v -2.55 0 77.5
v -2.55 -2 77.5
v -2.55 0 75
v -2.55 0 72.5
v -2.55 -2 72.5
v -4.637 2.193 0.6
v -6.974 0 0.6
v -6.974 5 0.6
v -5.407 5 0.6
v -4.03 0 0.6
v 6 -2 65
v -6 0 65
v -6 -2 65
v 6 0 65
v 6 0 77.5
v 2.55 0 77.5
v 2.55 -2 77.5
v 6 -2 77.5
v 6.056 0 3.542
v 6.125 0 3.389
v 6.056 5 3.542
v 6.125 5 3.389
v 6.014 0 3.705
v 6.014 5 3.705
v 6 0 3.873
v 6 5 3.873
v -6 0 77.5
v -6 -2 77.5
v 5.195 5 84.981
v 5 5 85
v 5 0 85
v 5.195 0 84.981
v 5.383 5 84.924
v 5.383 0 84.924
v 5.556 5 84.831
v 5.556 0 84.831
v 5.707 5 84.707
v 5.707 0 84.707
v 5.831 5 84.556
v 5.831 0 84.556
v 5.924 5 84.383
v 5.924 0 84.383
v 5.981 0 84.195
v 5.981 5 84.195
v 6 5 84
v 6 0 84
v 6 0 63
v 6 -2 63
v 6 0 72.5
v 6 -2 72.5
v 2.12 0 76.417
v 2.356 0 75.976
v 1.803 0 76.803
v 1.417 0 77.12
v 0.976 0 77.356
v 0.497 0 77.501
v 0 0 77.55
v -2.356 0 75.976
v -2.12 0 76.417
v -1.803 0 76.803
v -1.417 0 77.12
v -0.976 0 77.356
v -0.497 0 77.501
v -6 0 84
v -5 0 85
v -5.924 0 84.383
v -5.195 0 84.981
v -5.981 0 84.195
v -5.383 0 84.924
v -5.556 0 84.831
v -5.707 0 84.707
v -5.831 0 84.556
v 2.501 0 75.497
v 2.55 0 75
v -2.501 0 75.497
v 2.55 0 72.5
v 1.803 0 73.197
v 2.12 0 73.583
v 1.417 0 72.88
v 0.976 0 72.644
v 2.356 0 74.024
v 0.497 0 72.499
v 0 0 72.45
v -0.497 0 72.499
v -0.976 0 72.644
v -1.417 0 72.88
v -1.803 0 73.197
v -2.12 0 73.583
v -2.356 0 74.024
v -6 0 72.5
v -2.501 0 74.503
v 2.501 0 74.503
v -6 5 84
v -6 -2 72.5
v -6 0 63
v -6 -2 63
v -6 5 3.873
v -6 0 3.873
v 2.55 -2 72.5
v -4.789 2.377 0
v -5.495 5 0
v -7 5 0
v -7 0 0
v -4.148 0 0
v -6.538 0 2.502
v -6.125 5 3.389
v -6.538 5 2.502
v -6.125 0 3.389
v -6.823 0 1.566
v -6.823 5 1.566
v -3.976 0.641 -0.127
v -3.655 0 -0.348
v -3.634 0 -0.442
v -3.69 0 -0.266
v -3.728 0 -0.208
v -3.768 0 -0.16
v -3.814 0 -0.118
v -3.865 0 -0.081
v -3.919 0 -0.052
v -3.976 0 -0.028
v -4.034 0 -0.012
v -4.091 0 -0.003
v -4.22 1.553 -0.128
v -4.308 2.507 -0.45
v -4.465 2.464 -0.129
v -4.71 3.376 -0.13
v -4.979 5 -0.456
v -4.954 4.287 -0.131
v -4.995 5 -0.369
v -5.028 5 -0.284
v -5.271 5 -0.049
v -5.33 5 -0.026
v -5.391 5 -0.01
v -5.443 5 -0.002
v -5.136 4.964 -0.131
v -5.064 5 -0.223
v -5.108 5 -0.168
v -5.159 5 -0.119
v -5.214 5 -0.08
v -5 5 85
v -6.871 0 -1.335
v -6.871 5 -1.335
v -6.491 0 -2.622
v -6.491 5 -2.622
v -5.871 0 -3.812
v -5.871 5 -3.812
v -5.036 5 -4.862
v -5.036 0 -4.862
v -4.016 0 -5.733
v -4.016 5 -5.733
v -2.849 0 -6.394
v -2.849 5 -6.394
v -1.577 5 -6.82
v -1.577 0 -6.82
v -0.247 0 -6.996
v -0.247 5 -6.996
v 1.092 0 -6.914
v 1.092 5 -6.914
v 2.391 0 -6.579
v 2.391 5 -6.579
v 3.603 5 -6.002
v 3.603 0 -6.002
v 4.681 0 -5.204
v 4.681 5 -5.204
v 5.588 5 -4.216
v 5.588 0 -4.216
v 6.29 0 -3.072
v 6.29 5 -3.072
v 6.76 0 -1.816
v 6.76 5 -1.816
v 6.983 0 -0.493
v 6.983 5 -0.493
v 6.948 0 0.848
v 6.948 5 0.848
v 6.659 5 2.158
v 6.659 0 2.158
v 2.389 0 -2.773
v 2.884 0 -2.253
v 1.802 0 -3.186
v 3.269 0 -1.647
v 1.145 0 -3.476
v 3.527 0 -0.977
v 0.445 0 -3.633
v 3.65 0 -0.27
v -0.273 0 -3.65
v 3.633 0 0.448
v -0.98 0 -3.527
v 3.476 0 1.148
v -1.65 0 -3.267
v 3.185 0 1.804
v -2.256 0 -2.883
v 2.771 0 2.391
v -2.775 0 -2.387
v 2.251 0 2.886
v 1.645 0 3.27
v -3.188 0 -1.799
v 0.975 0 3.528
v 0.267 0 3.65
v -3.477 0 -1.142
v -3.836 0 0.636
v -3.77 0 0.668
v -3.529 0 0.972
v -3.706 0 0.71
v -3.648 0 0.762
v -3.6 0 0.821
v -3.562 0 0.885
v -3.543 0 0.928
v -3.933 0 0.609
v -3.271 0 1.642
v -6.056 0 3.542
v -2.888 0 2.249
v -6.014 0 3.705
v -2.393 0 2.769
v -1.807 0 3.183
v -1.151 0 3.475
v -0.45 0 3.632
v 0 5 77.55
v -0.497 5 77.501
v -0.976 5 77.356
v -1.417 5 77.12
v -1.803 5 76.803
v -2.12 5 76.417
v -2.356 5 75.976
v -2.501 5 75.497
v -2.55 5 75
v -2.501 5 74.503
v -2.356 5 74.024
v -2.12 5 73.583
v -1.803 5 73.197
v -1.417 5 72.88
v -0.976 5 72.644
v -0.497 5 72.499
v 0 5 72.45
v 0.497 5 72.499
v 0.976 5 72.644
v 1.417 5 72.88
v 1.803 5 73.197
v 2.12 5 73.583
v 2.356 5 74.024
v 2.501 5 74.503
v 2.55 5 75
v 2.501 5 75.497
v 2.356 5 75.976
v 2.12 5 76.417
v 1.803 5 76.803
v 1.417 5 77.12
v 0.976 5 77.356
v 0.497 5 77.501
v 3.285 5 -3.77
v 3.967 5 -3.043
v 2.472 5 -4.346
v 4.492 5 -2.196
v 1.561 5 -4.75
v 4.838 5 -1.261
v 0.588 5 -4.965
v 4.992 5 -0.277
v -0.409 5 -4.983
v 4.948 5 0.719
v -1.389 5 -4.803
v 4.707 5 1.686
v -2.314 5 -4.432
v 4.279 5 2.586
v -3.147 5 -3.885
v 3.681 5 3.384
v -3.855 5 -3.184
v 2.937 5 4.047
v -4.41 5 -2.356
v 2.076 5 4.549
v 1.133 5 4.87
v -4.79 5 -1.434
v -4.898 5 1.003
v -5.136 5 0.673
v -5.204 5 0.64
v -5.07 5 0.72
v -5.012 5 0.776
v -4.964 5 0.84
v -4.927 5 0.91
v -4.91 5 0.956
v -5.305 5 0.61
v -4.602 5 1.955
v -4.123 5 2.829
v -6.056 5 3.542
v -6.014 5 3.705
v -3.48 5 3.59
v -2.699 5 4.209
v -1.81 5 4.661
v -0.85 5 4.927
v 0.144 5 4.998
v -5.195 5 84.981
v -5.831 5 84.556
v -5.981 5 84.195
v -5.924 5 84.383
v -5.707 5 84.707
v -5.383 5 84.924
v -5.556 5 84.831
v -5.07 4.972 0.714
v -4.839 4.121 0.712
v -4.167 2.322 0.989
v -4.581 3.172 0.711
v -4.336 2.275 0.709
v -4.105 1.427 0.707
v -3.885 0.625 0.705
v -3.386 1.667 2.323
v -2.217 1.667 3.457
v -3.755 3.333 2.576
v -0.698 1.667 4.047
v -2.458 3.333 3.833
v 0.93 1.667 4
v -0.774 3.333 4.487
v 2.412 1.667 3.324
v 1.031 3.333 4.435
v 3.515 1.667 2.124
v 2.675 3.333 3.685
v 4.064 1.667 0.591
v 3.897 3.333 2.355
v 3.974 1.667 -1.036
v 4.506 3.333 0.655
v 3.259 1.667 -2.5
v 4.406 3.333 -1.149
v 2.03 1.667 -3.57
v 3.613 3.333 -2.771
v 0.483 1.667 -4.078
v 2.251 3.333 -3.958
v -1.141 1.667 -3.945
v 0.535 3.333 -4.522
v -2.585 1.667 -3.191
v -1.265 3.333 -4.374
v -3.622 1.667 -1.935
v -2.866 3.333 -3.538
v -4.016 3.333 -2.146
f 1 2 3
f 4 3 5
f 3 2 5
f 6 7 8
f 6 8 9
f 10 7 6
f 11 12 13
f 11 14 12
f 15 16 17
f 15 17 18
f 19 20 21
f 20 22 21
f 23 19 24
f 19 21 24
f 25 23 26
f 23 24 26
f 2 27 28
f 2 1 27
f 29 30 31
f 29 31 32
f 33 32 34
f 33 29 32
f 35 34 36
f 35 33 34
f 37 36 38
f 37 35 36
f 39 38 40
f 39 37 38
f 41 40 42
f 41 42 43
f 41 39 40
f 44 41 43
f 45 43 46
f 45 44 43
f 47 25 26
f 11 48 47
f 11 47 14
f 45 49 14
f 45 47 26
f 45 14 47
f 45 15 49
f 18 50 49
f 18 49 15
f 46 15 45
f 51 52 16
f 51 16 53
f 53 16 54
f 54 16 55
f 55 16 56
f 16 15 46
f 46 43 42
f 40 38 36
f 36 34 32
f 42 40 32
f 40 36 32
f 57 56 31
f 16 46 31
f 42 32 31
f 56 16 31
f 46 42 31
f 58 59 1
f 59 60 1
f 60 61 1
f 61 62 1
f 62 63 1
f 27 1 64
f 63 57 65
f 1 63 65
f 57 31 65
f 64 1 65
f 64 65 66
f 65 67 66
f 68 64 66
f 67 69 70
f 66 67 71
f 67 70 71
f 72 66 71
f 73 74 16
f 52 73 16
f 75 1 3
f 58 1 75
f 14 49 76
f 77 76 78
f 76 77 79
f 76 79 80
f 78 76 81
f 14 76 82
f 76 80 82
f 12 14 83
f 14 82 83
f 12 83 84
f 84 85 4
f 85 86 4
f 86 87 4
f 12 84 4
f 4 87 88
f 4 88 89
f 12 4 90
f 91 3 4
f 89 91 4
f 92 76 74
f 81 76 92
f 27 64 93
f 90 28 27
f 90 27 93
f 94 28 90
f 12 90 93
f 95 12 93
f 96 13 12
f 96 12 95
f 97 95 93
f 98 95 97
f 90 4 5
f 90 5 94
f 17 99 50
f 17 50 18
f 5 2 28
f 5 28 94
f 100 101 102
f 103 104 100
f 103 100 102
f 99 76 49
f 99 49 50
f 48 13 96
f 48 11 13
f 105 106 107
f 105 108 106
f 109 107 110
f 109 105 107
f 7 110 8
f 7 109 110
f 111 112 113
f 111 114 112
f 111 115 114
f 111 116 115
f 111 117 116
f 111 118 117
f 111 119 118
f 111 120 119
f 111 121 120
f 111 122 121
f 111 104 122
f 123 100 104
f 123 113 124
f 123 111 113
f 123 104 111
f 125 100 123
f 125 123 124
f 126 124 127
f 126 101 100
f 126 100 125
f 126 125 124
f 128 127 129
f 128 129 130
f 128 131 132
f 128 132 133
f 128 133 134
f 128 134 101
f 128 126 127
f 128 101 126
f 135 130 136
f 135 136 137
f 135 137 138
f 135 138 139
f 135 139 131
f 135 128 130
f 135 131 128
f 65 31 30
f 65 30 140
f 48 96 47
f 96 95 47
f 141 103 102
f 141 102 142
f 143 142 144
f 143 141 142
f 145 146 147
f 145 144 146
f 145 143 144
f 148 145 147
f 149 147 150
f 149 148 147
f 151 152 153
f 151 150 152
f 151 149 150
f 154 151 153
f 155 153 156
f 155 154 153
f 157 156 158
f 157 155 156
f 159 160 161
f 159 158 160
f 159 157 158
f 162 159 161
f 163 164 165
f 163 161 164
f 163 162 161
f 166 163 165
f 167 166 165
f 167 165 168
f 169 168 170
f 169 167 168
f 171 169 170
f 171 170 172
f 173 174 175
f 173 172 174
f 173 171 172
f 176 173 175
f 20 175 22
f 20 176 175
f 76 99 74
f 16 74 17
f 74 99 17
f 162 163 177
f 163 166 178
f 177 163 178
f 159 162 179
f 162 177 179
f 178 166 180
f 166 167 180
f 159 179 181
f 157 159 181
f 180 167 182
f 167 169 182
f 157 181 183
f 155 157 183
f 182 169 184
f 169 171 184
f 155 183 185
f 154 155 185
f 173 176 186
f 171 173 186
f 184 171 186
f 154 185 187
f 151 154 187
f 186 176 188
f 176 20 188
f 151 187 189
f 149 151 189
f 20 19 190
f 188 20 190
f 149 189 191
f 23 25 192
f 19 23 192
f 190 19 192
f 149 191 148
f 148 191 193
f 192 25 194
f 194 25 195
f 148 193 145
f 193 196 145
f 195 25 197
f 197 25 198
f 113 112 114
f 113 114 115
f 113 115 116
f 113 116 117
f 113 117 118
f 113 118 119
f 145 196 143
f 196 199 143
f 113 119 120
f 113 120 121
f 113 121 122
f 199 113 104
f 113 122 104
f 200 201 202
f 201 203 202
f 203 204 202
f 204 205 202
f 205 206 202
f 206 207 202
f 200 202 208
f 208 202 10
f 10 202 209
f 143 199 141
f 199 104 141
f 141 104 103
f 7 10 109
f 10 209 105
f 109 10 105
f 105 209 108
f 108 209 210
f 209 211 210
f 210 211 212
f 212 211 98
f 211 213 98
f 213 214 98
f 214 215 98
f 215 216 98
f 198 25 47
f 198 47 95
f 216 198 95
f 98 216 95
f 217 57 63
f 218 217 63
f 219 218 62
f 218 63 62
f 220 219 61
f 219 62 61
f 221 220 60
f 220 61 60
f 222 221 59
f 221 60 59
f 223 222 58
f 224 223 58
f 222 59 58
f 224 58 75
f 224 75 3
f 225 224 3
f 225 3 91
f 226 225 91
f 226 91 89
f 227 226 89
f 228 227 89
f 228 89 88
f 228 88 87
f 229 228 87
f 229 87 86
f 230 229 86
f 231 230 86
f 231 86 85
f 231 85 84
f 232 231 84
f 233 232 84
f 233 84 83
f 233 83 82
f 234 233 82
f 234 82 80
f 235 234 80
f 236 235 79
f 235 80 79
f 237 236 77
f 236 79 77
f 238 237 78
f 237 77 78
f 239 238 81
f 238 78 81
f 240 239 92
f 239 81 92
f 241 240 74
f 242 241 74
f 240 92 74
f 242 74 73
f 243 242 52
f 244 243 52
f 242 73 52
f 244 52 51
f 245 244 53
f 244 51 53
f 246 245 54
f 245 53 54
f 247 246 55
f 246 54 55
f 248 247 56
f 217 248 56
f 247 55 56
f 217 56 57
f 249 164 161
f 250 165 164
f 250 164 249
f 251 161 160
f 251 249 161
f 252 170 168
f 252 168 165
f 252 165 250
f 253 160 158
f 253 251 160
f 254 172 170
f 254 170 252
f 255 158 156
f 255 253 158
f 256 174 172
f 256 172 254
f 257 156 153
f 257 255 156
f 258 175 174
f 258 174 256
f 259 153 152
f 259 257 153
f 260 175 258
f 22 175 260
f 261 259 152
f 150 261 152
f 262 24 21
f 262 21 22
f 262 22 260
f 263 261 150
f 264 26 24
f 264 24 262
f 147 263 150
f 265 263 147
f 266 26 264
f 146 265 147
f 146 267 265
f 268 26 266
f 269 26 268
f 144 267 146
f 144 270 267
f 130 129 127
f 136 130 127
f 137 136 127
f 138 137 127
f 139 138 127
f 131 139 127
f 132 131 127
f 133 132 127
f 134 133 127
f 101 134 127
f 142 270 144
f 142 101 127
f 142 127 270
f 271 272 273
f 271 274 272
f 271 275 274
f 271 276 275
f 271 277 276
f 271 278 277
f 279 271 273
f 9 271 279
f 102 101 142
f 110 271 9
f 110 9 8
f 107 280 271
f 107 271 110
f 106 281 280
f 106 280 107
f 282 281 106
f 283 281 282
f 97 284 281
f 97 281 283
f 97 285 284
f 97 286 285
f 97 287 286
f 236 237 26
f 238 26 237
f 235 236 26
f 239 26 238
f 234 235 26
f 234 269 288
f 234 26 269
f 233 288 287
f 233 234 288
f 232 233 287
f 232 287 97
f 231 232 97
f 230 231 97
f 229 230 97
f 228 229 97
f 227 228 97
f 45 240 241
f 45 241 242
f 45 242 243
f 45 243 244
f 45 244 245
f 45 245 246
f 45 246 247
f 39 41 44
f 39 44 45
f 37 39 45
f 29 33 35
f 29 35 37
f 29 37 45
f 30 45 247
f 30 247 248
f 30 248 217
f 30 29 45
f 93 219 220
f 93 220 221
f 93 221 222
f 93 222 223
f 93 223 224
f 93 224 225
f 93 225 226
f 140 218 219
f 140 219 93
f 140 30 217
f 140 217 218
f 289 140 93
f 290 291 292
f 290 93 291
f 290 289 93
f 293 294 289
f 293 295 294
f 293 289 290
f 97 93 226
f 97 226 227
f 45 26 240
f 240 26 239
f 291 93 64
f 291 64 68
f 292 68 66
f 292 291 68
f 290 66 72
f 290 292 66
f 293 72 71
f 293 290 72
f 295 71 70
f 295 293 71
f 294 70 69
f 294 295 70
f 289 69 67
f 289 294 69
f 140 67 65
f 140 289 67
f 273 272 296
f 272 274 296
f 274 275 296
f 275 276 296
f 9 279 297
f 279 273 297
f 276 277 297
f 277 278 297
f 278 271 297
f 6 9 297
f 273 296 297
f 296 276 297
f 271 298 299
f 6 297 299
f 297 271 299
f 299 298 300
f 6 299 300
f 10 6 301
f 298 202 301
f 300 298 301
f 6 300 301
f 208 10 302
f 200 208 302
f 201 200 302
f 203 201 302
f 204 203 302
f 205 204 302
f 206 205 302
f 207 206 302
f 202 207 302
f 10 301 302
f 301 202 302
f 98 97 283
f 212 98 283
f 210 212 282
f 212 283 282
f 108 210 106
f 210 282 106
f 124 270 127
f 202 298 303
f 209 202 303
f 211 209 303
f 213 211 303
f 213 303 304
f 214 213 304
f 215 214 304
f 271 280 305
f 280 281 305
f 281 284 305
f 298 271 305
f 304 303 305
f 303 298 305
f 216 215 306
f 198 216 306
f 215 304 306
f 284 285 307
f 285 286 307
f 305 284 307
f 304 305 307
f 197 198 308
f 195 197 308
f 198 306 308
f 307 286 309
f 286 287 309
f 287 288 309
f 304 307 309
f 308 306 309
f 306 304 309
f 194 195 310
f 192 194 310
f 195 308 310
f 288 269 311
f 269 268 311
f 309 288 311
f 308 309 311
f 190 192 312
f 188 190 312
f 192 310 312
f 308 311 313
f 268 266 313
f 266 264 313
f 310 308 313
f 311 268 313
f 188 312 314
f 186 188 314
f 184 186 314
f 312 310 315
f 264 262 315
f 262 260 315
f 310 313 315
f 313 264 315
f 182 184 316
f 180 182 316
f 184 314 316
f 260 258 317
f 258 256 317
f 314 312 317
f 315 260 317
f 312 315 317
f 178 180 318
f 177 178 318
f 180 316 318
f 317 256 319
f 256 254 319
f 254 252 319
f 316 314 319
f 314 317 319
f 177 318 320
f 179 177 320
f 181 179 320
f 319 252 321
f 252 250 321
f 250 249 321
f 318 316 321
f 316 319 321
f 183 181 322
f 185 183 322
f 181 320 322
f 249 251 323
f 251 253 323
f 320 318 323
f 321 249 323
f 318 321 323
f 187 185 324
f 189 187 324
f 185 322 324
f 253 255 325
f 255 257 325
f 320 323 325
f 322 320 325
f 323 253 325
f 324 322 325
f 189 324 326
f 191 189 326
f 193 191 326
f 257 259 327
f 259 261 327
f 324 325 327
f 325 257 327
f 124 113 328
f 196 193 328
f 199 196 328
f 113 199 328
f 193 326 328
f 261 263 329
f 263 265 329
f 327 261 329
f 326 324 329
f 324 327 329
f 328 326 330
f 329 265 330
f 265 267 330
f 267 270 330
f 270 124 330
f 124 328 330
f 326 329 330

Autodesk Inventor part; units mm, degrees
ref_plane "YZ Plane" through (0, 0, 0) normal (1, 0, 0) x (0, 1, 0)
ref_plane "XZ Plane" through (0, 0, 0) normal (0, 1, 0) x (-1, 0, 0)
ref_plane "XY Plane" through (0, 0, 0) normal (0, 0, 1) x (1, 0, 0)
sketch "Sketch1" plane through (0, 0, 0) normal (0, 1, 0) x (-1, 0, 0)
  circle A0 centre (0, 0) radius 5
  line L0 (-6, 85) -> (6, 85)
  arc A1 (-6, 3.6056) -> (6, 3.6056) centre (0, 0) ccw
  line L1 (-6, 3.6056) -> (-6, 85)
  line L2 (6, 85) -> (6, 3.6056)
  point P0 (-6, 0)
  point P1 (-5, 85)
  point P2 (5, 85)
extrude "Extrusion1" add sketch "Sketch1" along normal blind 5
sketch "Sketch2" plane through (0, 5, 0) normal (0, 1, 0) x (1, 0, 0)
  line L0 (-6, -85) -> (6, -85) construction
  line L1 (0, -85) -> (0, -75) construction
  point P0 (0, 0)
  point P1 (-5, -85)
  point P2 (5, -85)
  dimension "d5" = 10
hole "Hole1" at (0, 5, 75) direction (0, -1, 0) diameter 5.1 end through all
draft "FaceDraft1" angle 15 pull direction (0, 1, 0) faces at (-4.9353, 3.3333, -0.8021) fixed edges at (5, 5, 0)
sketch "Sketch3" plane through (0, 0, 0) normal (0, -1, 0) x (1, 0, 0)
  line L0 (0, 0) -> (-10, 0)
  line L1 (-10, 0) -> (-10, 0.6)
  line L2 (-10, 0.6) -> (0, 0.6)
  line L3 (0, 0.6) -> (0, 0)
  dimension "d15" = 0.6
  dimension "d19" = 10
extrude "Extrusion2" cut sketch "Sketch3" against normal blind 10
fillet "Fillet2" radius 0.5 2 edges at (-4.2347, 2.3015, 0.6) (-4.3301, 2.5, 0)
sketch "Sketch4" plane through (0, 0, 0) normal (0, -1, 0) x (1, 0, 0)
  line L0 (6, 85) -> (-6, 85) construction
  line L1 (0, 85) -> (0, 65) construction
  line L2 (5, 84) -> (5, 4.3589) projected
  line L3 (-5, 4.3589) -> (-5, 84) projected
  line L4 (5, 65) -> (-5, 65)
  line L5 (-5, 65) -> (-5, 63)
  line L6 (-5, 63) -> (5, 63)
  line L7 (5, 63) -> (5, 65)
  line L8 (-5, 77.5) -> (5, 77.5)
  line L9 (5, 77.5) -> (5, 72.5)
  line L10 (5, 72.5) -> (-5, 72.5)
  line L11 (-5, 72.5) -> (-5, 77.5)
  line L12 (-5, 77.5) -> (5, 72.5) construction
  line L13 (5, 77.5) -> (-5, 72.5) construction
  circle A0 centre (0, 75) radius 2.55 projected
  point P0 (0, 0)
  point P1 (4, 85)
  point P2 (-4, 85)
  dimension "d21" = 20
  dimension "d22" = 2
  dimension "d23" = 5
extrude "Extrusion3" add sketch "Sketch4" along normal blind 2 contours L2 L10 A0 L8 | L2 L6 L3 L4 | A0 L10 L3 L8
sketch "Sketch5" plane through (0, -2, 0) normal (0, -1, 0) x (1, 0, 0)
  arc A0 (0.5025, 72.5) -> (0.5025, 77.5) centre (0, 75) ccw projected
  circle A1 centre (0, 75) radius 2.55 projected
  line L0 (2.55, 77.55) -> (-2.55, 77.55)
  line L1 (-2.55, 77.55) -> (-2.55, 72.45)
  line L2 (-2.55, 72.45) -> (2.55, 72.45)
  line L3 (2.55, 72.45) -> (2.55, 77.55)
  line L4 (2.55, 77.55) -> (-2.55, 72.45) construction
  line L5 (-2.55, 77.55) -> (2.55, 72.45) construction
  arc A2 (-0.5025, 72.5) -> (0.5025, 72.5) centre (0, 75) ccw projected
  arc A3 (0.5025, 77.5) -> (-0.5025, 77.5) centre (0, 75) ccw projected
  arc A4 (-0.5025, 77.5) -> (-0.5025, 72.5) centre (0, 75) ccw projected
  point P0 (0, 0)
  dimension "d26" = 5.1
  dimension "d27" = 5.1
extrude "Extrusion4" cut sketch "Sketch5" against normal blind 2 contours A0 L3 L2 A1 | A0 A1 L0 L3 | L2 L1 A1 | A1 L1 L0
sketch "Sketch6" plane through (-5, 0, 72.5) normal (-1, 0, 0) x (0, 0, 1)
  line L0 (0, 0) -> (5, 0) projected
  line L1 (0, 0) -> (0, -2) projected
  line L2 (5, -2) -> (0, -2) projected
  line L3 (5, 0) -> (5, -2) projected
  line L4 (-9.5, 0) -> (-7.5, 0) projected
  line L5 (-9.5, 0) -> (-9.5, -2) projected
  line L6 (-7.5, -2) -> (-9.5, -2) projected
  line L7 (-7.5, 0) -> (-7.5, -2) projected
  point P0 (-72.5, 0)
extrude "Extrusion5" add sketch "Sketch6" along normal blind 1
sketch "Sketch7" plane through (5, 0, 77.5) normal (1, 0, 0) x (0, 0, -1)
  line L0 (0, 0) -> (5, 0) projected
  line L1 (0, 0) -> (0, -2) projected
  line L2 (5, -2) -> (0, -2) projected
  line L3 (5, 0) -> (5, -2) projected
  line L4 (12.5, 0) -> (14.5, 0) projected
  line L5 (12.5, 0) -> (12.5, -2) projected
  line L6 (14.5, -2) -> (12.5, -2) projected
  line L7 (14.5, 0) -> (14.5, -2) projected
  point P0 (77.5, 0)
extrude "Extrusion6" add sketch "Sketch7" along normal blind 1
fillet "Fillet4" radius 1 4 edges at (6, 2.5, 85) (-6, 2.5, 85) (6, 2.5, 3.6056) (-6, 2.5, 3.6056)
properties part number "filament guide stronger"
